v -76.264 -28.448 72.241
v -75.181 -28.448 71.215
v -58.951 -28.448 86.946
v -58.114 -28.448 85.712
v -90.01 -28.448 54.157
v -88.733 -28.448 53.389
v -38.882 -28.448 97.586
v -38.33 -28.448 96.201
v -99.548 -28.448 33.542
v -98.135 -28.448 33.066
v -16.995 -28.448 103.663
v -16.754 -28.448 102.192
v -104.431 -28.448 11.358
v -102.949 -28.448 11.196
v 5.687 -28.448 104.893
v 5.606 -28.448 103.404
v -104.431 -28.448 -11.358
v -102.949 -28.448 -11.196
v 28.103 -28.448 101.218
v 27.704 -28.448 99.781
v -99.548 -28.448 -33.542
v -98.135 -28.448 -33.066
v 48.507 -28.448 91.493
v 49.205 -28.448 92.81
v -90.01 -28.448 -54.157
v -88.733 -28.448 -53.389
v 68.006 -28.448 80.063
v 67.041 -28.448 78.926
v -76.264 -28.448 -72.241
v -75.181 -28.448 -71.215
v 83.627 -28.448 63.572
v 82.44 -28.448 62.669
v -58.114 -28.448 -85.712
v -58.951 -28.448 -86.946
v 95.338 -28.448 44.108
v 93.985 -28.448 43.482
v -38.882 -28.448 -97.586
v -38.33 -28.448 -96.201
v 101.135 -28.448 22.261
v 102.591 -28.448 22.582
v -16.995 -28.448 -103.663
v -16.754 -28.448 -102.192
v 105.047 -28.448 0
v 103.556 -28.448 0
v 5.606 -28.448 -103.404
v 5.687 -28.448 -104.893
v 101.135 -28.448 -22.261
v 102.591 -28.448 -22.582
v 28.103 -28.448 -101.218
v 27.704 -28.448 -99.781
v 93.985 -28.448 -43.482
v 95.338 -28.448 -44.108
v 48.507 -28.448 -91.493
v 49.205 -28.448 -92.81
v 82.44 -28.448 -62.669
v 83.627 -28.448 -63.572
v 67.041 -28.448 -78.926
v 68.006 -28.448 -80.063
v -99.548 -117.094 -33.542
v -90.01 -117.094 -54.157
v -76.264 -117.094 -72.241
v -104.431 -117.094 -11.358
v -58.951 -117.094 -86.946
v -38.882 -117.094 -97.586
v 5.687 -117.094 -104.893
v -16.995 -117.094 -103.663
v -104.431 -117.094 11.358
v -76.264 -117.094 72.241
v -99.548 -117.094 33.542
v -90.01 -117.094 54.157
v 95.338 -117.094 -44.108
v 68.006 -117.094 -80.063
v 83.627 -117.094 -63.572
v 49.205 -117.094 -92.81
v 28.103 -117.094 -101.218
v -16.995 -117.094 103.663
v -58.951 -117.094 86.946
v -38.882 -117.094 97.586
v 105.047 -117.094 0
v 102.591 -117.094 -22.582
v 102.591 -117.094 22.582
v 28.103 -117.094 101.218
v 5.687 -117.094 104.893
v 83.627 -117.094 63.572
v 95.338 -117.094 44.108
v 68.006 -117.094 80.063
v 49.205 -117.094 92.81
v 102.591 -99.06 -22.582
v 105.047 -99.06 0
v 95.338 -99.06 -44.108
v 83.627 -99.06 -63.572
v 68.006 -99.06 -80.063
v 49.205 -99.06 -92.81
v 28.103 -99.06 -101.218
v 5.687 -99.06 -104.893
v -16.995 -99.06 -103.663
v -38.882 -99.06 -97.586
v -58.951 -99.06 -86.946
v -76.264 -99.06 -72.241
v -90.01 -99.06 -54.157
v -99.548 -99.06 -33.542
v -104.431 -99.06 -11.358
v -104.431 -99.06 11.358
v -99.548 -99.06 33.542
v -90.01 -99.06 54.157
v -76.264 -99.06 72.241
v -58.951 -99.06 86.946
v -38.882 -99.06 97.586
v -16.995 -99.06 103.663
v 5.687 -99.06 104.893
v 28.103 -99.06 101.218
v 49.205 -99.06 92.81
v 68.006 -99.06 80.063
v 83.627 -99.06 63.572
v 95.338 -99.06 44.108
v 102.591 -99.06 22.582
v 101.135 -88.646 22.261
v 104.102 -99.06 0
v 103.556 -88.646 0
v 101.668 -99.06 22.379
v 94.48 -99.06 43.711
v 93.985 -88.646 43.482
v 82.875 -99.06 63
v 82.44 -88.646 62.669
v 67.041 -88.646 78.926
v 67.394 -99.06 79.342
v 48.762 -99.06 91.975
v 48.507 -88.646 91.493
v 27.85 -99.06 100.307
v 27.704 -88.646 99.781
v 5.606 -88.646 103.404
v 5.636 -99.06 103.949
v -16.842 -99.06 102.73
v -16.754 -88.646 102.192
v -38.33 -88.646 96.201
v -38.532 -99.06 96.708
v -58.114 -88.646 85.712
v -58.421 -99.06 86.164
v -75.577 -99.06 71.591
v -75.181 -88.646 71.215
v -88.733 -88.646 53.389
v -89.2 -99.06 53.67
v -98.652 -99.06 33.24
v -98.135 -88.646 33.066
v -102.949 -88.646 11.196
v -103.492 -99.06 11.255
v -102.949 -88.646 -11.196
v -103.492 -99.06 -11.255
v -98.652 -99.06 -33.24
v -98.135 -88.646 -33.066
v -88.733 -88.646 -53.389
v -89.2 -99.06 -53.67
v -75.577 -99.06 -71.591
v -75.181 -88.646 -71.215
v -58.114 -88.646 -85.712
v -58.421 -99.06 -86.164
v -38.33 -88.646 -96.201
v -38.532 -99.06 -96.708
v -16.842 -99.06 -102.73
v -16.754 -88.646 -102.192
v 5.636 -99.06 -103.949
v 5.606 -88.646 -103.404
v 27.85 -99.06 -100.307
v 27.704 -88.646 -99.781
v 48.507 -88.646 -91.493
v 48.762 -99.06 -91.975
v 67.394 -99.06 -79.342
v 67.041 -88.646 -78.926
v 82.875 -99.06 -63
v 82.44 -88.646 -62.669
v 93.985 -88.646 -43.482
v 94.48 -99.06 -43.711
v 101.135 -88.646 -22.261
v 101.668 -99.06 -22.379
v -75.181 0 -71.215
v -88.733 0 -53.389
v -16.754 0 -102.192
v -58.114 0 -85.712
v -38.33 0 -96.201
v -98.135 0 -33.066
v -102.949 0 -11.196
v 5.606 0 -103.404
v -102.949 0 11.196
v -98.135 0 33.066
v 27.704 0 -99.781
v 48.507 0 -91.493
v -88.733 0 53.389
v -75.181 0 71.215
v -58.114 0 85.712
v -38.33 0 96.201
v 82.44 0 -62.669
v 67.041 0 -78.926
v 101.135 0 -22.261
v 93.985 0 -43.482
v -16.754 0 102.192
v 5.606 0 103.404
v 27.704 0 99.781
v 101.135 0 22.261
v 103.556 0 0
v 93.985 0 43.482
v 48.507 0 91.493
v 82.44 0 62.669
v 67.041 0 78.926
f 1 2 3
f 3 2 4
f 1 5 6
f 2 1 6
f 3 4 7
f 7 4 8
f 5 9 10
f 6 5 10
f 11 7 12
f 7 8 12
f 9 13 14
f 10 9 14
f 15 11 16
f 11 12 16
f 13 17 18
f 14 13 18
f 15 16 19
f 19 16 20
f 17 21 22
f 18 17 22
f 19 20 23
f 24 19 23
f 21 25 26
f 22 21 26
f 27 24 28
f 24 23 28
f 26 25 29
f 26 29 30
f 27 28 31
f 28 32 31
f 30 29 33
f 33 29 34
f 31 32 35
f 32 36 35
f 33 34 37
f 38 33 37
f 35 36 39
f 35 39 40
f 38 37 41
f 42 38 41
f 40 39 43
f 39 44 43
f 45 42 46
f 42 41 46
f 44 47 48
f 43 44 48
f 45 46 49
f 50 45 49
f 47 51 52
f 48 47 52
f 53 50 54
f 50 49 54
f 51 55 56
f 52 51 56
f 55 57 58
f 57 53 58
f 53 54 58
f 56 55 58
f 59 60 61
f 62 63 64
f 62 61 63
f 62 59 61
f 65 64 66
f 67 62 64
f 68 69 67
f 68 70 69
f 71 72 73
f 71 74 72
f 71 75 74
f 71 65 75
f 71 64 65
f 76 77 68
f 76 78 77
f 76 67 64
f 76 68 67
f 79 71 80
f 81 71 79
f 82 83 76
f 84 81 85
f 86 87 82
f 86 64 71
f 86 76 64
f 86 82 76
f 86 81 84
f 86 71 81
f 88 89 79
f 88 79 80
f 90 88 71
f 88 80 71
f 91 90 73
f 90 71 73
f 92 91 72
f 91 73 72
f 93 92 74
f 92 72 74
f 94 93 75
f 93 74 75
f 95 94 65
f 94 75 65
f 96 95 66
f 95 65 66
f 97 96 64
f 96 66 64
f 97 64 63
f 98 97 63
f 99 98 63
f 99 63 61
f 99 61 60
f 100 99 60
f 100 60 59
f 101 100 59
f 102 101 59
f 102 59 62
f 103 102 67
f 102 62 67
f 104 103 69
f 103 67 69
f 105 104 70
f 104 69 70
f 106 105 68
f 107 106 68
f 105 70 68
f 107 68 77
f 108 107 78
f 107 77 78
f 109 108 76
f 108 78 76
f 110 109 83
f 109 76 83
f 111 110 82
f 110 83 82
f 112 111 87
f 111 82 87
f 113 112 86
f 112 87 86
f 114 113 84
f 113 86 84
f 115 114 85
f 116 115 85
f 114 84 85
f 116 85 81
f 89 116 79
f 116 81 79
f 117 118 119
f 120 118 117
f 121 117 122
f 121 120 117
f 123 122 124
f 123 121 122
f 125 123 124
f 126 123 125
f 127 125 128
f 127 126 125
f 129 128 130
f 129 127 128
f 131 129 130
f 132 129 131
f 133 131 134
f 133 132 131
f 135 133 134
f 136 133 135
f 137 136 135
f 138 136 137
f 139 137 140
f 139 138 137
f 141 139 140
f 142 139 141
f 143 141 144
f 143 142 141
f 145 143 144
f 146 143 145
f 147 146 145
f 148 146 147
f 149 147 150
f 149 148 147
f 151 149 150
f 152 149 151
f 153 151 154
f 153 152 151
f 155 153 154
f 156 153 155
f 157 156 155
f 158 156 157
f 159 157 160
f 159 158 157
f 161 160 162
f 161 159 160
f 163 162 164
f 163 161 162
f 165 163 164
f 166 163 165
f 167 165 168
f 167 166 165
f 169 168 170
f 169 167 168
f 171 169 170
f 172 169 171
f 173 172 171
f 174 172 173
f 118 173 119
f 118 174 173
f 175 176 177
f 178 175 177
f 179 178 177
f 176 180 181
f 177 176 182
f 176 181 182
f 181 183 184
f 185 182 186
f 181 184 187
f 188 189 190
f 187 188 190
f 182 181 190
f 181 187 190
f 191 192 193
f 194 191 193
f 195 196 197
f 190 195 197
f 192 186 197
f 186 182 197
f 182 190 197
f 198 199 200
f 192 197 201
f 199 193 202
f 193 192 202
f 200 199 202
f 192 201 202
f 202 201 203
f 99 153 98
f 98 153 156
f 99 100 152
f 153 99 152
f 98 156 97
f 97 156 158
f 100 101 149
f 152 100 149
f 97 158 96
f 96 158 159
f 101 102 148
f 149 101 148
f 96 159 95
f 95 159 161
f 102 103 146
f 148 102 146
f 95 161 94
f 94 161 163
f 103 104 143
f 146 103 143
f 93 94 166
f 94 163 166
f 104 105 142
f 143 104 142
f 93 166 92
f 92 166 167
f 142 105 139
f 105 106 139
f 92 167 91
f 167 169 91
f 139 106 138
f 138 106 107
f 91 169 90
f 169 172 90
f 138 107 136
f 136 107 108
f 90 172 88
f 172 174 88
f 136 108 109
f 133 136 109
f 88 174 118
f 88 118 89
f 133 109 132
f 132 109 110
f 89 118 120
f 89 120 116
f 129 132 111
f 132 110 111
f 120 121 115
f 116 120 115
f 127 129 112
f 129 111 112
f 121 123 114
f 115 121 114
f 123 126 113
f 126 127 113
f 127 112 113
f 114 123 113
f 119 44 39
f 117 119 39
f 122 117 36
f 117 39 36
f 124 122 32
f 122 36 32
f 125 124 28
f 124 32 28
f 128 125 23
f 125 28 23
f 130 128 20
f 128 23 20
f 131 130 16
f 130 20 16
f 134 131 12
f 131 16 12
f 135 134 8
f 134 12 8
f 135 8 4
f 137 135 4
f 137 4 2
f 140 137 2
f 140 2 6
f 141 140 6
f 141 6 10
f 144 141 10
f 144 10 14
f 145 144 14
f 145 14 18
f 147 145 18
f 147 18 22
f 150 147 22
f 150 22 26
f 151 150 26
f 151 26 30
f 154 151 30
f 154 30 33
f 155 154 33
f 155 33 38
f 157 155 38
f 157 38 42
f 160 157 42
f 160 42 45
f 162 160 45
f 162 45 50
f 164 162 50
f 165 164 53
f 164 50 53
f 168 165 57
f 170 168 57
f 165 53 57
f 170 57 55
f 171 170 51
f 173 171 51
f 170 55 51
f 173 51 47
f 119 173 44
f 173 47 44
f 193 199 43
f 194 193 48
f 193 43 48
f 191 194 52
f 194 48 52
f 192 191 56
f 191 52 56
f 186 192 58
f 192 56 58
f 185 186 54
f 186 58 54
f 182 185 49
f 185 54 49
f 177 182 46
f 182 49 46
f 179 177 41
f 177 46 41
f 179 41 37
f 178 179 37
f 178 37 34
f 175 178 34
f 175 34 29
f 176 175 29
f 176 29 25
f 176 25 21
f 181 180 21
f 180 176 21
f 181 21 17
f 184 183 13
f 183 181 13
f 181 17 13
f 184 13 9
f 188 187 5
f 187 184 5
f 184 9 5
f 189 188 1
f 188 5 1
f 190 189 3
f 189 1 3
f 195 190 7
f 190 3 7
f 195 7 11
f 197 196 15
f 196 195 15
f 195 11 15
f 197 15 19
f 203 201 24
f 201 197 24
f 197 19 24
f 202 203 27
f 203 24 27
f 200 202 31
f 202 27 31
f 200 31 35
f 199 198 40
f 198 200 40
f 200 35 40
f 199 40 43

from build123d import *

# Parameters (mm, degrees)
F0_R       = 103.556034567
F1_DEPTH   = 88.646
F1_FACE_R  = 103.556034567
F1_FACE1_R = 103.556034567
F3_DEPTH   = 28.448
F3_TAPER   = -3
F4_DEPTH   = 18.034


# Not quite as in the source:
# - a feature names something its author has since deleted; it is built from what else it names


with BuildPart() as f1:
    # F0 (on Front) → F1 (new body)
    with BuildSketch(Plane.XZ):
        Circle(F0_R)
    extrude(amount=F1_DEPTH)

    # F1_face (on face) + F1_face1 (on face) → F3 (join)
    with BuildSketch(Plane.XZ.offset(88.646)):
        Circle(F1_FACE_R)
    with BuildSketch(Plane(origin=(0, 0, 0), x_dir=(1, 0, 0), z_dir=(0, 1, 0))):
        Circle(F1_FACE1_R)
    extrude(amount=F3_DEPTH, taper=F3_TAPER, dir=(0, -1, 0))

    # F4 (add): a face of the model
    f4_faces = [f1.faces().sort_by_distance(p)[0] for p in [
        (0, -117.094, 0),
    ]]
    extrude(f4_faces, amount=-F4_DEPTH)


solid = f1.part
